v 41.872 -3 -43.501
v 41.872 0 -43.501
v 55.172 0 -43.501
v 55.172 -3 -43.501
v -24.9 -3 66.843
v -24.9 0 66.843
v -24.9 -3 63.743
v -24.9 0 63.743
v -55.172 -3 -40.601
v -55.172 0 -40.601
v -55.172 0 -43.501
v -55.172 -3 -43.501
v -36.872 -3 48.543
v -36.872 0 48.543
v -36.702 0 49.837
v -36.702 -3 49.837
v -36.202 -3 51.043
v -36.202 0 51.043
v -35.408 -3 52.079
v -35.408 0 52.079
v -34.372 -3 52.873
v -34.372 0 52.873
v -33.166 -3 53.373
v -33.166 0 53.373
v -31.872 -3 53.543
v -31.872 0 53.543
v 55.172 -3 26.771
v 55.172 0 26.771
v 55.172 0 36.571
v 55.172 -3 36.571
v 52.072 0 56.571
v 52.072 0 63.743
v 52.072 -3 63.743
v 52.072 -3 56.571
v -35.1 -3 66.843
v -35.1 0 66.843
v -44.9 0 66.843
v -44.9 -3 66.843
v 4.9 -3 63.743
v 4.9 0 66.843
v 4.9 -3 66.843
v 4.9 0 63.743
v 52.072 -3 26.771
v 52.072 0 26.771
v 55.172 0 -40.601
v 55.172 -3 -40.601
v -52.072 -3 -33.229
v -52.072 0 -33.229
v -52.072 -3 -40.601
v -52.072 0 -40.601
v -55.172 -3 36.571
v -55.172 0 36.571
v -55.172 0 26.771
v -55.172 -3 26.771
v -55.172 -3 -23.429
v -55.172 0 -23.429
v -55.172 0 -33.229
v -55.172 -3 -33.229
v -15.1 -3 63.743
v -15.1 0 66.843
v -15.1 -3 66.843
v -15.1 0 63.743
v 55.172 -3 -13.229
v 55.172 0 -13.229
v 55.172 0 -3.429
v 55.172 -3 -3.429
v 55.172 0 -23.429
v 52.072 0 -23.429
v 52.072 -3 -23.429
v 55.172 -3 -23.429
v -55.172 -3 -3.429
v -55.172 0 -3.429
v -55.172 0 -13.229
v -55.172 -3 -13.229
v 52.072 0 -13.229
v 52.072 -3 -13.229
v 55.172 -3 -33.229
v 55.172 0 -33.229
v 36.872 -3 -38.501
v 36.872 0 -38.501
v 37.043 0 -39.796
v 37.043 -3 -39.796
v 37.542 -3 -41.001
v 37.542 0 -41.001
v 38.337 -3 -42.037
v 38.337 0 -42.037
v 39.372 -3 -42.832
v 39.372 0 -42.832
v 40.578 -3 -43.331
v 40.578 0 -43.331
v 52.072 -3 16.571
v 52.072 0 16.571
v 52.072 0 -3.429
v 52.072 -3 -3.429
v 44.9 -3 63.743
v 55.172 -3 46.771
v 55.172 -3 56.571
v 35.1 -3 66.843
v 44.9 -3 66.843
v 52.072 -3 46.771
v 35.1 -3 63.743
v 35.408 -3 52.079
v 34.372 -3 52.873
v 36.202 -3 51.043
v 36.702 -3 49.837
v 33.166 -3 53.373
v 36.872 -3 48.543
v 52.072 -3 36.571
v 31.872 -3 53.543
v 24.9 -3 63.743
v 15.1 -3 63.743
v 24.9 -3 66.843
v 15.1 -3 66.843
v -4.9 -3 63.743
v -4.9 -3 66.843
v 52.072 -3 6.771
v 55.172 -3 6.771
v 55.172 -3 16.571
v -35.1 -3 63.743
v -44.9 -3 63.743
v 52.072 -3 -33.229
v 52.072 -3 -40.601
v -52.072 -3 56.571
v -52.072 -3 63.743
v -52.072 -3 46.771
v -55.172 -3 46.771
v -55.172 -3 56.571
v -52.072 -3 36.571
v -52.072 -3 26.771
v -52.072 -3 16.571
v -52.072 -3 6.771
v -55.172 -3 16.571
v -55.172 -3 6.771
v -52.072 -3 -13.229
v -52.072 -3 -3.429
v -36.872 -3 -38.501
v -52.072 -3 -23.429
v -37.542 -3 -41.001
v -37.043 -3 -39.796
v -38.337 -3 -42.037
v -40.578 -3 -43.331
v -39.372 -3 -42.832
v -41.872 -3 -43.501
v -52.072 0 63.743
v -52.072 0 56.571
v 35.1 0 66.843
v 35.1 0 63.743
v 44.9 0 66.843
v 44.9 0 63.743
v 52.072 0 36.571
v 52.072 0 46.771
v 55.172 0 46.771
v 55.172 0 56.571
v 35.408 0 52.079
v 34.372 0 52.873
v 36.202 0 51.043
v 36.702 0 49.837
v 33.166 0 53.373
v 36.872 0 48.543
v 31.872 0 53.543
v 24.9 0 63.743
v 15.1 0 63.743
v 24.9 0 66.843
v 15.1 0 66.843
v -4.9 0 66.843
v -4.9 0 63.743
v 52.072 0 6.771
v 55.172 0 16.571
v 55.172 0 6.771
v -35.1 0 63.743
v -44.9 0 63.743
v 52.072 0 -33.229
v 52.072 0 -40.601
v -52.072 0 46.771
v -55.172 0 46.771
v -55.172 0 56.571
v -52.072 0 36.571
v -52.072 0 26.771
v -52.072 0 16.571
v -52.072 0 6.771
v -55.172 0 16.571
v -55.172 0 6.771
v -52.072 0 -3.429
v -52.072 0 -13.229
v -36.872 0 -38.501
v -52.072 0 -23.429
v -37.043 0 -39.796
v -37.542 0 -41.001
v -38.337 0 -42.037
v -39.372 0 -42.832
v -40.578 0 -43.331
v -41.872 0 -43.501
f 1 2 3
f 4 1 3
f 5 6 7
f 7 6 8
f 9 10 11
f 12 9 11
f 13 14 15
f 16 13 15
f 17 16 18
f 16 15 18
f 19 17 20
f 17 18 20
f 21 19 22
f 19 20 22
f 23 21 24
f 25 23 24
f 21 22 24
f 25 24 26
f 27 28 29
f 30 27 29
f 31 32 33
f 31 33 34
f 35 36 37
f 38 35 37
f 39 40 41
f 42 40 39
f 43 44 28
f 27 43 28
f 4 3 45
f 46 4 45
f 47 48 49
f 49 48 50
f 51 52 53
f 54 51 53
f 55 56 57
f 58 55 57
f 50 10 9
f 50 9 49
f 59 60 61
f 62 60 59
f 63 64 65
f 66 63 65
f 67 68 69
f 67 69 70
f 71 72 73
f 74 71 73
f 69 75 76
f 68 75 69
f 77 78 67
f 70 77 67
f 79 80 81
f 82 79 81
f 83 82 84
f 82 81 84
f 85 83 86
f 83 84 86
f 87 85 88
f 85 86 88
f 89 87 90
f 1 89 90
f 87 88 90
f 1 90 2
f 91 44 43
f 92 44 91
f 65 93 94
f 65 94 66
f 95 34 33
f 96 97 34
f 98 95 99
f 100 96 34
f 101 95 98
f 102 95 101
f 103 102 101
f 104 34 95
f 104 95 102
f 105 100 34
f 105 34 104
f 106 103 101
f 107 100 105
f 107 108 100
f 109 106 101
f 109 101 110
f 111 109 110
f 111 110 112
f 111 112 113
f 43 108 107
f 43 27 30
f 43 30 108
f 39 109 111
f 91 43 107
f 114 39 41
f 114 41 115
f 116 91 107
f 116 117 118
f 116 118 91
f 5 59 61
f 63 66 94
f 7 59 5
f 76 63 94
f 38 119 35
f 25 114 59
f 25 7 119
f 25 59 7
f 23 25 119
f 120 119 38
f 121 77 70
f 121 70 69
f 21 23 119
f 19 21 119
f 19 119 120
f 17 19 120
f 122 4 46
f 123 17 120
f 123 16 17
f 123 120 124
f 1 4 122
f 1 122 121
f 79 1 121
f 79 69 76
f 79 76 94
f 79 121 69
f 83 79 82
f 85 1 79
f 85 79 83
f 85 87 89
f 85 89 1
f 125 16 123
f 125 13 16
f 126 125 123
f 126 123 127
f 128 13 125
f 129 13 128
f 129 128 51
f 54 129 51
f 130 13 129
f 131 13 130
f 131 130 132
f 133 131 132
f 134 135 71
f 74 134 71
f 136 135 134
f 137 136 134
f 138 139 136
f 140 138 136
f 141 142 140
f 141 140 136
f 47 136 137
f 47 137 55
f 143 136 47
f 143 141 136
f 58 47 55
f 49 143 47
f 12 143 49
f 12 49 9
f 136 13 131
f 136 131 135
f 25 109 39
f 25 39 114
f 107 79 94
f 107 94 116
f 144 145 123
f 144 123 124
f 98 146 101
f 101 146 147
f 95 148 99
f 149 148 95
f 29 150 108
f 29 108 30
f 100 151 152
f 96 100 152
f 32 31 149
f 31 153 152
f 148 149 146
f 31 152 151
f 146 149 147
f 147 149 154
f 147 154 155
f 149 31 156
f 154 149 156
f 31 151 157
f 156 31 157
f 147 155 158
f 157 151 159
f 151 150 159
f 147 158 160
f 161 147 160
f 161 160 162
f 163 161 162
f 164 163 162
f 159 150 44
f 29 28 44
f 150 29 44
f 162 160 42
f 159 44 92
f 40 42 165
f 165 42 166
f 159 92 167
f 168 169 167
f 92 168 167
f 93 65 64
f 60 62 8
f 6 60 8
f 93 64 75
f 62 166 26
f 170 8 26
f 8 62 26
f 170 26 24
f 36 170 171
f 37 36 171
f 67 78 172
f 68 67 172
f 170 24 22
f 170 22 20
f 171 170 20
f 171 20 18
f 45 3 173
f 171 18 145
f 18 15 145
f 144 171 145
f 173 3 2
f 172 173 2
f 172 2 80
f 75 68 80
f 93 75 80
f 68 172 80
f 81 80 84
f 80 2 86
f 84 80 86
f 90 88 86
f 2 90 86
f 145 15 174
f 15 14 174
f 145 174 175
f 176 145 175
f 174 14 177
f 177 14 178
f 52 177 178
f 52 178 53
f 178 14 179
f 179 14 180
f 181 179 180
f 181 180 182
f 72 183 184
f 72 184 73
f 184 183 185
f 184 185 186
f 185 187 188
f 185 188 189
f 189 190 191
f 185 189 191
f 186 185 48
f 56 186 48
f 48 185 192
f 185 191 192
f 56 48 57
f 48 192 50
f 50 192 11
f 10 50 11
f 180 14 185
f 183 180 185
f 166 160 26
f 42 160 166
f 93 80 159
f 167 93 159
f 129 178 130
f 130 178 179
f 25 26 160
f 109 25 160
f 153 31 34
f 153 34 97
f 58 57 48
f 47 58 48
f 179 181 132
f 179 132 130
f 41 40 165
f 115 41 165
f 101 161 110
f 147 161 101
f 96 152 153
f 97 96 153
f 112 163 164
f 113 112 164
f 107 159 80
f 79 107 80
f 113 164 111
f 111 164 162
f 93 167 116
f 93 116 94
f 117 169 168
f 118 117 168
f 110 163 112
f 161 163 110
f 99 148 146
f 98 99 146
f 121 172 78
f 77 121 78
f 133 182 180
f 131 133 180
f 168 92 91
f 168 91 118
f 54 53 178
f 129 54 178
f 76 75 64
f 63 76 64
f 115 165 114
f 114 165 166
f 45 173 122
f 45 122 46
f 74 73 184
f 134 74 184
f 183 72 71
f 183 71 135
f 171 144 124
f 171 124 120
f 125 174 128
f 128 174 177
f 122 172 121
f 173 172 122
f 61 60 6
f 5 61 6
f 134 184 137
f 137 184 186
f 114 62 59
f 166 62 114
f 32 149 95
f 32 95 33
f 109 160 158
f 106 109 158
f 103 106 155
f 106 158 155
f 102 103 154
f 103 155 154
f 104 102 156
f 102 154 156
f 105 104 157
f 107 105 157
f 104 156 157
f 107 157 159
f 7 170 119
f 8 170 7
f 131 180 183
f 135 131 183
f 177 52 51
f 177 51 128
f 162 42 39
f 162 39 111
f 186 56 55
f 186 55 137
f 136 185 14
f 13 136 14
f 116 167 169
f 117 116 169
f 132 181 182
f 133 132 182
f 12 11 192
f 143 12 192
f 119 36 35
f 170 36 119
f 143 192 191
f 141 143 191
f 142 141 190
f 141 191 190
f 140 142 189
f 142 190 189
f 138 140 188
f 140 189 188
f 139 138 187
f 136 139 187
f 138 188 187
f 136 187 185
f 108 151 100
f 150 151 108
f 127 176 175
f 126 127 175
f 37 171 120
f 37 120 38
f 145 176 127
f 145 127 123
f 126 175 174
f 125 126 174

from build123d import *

# Parameters (mm, degrees)
BOSS_EXTRUDE1_DEPTH = 3
SKETCH3_W           = 3.2
SKETCH3_H           = 10.2
SKETCH3_W_2         = 10.2
SKETCH3_H_2         = 3.2
SKETCH3_H_3         = 7.372217102
CUT_EXTRUDE1_DEPTH  = 4


with BuildPart() as part:
    # Sketch1 → Boss-Extrude1 (new body)
    with BuildSketch(Plane(origin=(0, 0, 0), x_dir=(1, 0, 0), z_dir=(0, 1, 0))):
        with BuildLine():
            Line((-55.172217102, 43.501443346), (-41.872217102, 43.501443346))
            ThreePointArc((-41.872217102, 43.501443346), (-38.336683196, 42.036977252), (-36.872217102, 38.501443346))
            Line((-36.872217102, 38.501443346), (-36.872217102, -48.542990858))
            ThreePointArc((-36.872217102, -48.542990858), (-35.407751008, -52.078524764), (-31.872217102, -53.542990858))
            Line((-31.872217102, -53.542990858), (31.872217102, -53.542990858))
            ThreePointArc((31.872217102, -53.542990858), (35.407751008, -52.078524764), (36.872217102, -48.542990858))
            Line((36.872217102, -48.542990858), (36.872217102, 38.501443346))
            ThreePointArc((36.872217102, 38.501443346), (38.336683196, 42.036977252), (41.872217102, 43.501443346))
            Line((41.872217102, 43.501443346), (55.172217102, 43.501443346))
            Line((55.172217102, 43.501443346), (55.172217102, -66.842990858))
            Line((55.172217102, -66.842990858), (-55.172217102, -66.842990858))
            Line((-55.172217102, -66.842990858), (-55.172217102, 43.501443346))
        make_face()
    extrude(amount=-BOSS_EXTRUDE1_DEPTH)

    # Sketch3 → Cut-Extrude1 (cut, through all)
    with BuildSketch(Plane(origin=(0, 0, 0), x_dir=(1, 0, 0), z_dir=(0, 1, 0))):
        with Locations((53.672217102, -41.670773756)):
            Rectangle(SKETCH3_W, SKETCH3_H)
        Polygon((52.072217102, -56.570773756), (55.272217102, -56.570773756), (55.272217102, -66.942990858), (44.9, -66.942990858), (44.9, -63.742990858), (52.072217102, -63.742990858), align=None)
        with Locations((30, -65.342990858)):
            Rectangle(SKETCH3_W_2, SKETCH3_H_2)
        with Locations((53.672217102, 18.329226244)):
            Rectangle(SKETCH3_W, SKETCH3_H)
        with Locations((53.672217102, -1.670773756)):
            Rectangle(SKETCH3_W, SKETCH3_H)
        with Locations((53.672217102, 36.915334795)):
            Rectangle(SKETCH3_W, SKETCH3_H_3)
        with Locations((10, -65.342990858)):
            Rectangle(SKETCH3_W_2, SKETCH3_H_2)
        with Locations((53.672217102, -21.670773756)):
            Rectangle(SKETCH3_W, SKETCH3_H)
        with Locations((-53.672217102, 36.915334795)):
            Rectangle(SKETCH3_W, SKETCH3_H_3)
        with Locations((-10, -65.342990858)):
            Rectangle(SKETCH3_W_2, SKETCH3_H_2)
        with Locations((-53.672217102, -1.670773756)):
            Rectangle(SKETCH3_W, SKETCH3_H)
        with Locations((-53.672217102, 18.329226244)):
            Rectangle(SKETCH3_W, SKETCH3_H)
        with Locations((-30, -65.342990858)):
            Rectangle(SKETCH3_W_2, SKETCH3_H_2)
        Polygon((-44.9, -66.942990858), (-55.272217102, -66.942990858), (-55.272217102, -56.570773756), (-52.072217102, -56.570773756), (-52.072217102, -63.742990858), (-44.9, -63.742990858), align=None)
        with Locations((-53.672217102, -41.670773756)):
            Rectangle(SKETCH3_W, SKETCH3_H)
        with Locations((-53.672217102, -21.670773756)):
            Rectangle(SKETCH3_W, SKETCH3_H)
    extrude(amount=-CUT_EXTRUDE1_DEPTH, mode=Mode.SUBTRACT)


solid = part.part
